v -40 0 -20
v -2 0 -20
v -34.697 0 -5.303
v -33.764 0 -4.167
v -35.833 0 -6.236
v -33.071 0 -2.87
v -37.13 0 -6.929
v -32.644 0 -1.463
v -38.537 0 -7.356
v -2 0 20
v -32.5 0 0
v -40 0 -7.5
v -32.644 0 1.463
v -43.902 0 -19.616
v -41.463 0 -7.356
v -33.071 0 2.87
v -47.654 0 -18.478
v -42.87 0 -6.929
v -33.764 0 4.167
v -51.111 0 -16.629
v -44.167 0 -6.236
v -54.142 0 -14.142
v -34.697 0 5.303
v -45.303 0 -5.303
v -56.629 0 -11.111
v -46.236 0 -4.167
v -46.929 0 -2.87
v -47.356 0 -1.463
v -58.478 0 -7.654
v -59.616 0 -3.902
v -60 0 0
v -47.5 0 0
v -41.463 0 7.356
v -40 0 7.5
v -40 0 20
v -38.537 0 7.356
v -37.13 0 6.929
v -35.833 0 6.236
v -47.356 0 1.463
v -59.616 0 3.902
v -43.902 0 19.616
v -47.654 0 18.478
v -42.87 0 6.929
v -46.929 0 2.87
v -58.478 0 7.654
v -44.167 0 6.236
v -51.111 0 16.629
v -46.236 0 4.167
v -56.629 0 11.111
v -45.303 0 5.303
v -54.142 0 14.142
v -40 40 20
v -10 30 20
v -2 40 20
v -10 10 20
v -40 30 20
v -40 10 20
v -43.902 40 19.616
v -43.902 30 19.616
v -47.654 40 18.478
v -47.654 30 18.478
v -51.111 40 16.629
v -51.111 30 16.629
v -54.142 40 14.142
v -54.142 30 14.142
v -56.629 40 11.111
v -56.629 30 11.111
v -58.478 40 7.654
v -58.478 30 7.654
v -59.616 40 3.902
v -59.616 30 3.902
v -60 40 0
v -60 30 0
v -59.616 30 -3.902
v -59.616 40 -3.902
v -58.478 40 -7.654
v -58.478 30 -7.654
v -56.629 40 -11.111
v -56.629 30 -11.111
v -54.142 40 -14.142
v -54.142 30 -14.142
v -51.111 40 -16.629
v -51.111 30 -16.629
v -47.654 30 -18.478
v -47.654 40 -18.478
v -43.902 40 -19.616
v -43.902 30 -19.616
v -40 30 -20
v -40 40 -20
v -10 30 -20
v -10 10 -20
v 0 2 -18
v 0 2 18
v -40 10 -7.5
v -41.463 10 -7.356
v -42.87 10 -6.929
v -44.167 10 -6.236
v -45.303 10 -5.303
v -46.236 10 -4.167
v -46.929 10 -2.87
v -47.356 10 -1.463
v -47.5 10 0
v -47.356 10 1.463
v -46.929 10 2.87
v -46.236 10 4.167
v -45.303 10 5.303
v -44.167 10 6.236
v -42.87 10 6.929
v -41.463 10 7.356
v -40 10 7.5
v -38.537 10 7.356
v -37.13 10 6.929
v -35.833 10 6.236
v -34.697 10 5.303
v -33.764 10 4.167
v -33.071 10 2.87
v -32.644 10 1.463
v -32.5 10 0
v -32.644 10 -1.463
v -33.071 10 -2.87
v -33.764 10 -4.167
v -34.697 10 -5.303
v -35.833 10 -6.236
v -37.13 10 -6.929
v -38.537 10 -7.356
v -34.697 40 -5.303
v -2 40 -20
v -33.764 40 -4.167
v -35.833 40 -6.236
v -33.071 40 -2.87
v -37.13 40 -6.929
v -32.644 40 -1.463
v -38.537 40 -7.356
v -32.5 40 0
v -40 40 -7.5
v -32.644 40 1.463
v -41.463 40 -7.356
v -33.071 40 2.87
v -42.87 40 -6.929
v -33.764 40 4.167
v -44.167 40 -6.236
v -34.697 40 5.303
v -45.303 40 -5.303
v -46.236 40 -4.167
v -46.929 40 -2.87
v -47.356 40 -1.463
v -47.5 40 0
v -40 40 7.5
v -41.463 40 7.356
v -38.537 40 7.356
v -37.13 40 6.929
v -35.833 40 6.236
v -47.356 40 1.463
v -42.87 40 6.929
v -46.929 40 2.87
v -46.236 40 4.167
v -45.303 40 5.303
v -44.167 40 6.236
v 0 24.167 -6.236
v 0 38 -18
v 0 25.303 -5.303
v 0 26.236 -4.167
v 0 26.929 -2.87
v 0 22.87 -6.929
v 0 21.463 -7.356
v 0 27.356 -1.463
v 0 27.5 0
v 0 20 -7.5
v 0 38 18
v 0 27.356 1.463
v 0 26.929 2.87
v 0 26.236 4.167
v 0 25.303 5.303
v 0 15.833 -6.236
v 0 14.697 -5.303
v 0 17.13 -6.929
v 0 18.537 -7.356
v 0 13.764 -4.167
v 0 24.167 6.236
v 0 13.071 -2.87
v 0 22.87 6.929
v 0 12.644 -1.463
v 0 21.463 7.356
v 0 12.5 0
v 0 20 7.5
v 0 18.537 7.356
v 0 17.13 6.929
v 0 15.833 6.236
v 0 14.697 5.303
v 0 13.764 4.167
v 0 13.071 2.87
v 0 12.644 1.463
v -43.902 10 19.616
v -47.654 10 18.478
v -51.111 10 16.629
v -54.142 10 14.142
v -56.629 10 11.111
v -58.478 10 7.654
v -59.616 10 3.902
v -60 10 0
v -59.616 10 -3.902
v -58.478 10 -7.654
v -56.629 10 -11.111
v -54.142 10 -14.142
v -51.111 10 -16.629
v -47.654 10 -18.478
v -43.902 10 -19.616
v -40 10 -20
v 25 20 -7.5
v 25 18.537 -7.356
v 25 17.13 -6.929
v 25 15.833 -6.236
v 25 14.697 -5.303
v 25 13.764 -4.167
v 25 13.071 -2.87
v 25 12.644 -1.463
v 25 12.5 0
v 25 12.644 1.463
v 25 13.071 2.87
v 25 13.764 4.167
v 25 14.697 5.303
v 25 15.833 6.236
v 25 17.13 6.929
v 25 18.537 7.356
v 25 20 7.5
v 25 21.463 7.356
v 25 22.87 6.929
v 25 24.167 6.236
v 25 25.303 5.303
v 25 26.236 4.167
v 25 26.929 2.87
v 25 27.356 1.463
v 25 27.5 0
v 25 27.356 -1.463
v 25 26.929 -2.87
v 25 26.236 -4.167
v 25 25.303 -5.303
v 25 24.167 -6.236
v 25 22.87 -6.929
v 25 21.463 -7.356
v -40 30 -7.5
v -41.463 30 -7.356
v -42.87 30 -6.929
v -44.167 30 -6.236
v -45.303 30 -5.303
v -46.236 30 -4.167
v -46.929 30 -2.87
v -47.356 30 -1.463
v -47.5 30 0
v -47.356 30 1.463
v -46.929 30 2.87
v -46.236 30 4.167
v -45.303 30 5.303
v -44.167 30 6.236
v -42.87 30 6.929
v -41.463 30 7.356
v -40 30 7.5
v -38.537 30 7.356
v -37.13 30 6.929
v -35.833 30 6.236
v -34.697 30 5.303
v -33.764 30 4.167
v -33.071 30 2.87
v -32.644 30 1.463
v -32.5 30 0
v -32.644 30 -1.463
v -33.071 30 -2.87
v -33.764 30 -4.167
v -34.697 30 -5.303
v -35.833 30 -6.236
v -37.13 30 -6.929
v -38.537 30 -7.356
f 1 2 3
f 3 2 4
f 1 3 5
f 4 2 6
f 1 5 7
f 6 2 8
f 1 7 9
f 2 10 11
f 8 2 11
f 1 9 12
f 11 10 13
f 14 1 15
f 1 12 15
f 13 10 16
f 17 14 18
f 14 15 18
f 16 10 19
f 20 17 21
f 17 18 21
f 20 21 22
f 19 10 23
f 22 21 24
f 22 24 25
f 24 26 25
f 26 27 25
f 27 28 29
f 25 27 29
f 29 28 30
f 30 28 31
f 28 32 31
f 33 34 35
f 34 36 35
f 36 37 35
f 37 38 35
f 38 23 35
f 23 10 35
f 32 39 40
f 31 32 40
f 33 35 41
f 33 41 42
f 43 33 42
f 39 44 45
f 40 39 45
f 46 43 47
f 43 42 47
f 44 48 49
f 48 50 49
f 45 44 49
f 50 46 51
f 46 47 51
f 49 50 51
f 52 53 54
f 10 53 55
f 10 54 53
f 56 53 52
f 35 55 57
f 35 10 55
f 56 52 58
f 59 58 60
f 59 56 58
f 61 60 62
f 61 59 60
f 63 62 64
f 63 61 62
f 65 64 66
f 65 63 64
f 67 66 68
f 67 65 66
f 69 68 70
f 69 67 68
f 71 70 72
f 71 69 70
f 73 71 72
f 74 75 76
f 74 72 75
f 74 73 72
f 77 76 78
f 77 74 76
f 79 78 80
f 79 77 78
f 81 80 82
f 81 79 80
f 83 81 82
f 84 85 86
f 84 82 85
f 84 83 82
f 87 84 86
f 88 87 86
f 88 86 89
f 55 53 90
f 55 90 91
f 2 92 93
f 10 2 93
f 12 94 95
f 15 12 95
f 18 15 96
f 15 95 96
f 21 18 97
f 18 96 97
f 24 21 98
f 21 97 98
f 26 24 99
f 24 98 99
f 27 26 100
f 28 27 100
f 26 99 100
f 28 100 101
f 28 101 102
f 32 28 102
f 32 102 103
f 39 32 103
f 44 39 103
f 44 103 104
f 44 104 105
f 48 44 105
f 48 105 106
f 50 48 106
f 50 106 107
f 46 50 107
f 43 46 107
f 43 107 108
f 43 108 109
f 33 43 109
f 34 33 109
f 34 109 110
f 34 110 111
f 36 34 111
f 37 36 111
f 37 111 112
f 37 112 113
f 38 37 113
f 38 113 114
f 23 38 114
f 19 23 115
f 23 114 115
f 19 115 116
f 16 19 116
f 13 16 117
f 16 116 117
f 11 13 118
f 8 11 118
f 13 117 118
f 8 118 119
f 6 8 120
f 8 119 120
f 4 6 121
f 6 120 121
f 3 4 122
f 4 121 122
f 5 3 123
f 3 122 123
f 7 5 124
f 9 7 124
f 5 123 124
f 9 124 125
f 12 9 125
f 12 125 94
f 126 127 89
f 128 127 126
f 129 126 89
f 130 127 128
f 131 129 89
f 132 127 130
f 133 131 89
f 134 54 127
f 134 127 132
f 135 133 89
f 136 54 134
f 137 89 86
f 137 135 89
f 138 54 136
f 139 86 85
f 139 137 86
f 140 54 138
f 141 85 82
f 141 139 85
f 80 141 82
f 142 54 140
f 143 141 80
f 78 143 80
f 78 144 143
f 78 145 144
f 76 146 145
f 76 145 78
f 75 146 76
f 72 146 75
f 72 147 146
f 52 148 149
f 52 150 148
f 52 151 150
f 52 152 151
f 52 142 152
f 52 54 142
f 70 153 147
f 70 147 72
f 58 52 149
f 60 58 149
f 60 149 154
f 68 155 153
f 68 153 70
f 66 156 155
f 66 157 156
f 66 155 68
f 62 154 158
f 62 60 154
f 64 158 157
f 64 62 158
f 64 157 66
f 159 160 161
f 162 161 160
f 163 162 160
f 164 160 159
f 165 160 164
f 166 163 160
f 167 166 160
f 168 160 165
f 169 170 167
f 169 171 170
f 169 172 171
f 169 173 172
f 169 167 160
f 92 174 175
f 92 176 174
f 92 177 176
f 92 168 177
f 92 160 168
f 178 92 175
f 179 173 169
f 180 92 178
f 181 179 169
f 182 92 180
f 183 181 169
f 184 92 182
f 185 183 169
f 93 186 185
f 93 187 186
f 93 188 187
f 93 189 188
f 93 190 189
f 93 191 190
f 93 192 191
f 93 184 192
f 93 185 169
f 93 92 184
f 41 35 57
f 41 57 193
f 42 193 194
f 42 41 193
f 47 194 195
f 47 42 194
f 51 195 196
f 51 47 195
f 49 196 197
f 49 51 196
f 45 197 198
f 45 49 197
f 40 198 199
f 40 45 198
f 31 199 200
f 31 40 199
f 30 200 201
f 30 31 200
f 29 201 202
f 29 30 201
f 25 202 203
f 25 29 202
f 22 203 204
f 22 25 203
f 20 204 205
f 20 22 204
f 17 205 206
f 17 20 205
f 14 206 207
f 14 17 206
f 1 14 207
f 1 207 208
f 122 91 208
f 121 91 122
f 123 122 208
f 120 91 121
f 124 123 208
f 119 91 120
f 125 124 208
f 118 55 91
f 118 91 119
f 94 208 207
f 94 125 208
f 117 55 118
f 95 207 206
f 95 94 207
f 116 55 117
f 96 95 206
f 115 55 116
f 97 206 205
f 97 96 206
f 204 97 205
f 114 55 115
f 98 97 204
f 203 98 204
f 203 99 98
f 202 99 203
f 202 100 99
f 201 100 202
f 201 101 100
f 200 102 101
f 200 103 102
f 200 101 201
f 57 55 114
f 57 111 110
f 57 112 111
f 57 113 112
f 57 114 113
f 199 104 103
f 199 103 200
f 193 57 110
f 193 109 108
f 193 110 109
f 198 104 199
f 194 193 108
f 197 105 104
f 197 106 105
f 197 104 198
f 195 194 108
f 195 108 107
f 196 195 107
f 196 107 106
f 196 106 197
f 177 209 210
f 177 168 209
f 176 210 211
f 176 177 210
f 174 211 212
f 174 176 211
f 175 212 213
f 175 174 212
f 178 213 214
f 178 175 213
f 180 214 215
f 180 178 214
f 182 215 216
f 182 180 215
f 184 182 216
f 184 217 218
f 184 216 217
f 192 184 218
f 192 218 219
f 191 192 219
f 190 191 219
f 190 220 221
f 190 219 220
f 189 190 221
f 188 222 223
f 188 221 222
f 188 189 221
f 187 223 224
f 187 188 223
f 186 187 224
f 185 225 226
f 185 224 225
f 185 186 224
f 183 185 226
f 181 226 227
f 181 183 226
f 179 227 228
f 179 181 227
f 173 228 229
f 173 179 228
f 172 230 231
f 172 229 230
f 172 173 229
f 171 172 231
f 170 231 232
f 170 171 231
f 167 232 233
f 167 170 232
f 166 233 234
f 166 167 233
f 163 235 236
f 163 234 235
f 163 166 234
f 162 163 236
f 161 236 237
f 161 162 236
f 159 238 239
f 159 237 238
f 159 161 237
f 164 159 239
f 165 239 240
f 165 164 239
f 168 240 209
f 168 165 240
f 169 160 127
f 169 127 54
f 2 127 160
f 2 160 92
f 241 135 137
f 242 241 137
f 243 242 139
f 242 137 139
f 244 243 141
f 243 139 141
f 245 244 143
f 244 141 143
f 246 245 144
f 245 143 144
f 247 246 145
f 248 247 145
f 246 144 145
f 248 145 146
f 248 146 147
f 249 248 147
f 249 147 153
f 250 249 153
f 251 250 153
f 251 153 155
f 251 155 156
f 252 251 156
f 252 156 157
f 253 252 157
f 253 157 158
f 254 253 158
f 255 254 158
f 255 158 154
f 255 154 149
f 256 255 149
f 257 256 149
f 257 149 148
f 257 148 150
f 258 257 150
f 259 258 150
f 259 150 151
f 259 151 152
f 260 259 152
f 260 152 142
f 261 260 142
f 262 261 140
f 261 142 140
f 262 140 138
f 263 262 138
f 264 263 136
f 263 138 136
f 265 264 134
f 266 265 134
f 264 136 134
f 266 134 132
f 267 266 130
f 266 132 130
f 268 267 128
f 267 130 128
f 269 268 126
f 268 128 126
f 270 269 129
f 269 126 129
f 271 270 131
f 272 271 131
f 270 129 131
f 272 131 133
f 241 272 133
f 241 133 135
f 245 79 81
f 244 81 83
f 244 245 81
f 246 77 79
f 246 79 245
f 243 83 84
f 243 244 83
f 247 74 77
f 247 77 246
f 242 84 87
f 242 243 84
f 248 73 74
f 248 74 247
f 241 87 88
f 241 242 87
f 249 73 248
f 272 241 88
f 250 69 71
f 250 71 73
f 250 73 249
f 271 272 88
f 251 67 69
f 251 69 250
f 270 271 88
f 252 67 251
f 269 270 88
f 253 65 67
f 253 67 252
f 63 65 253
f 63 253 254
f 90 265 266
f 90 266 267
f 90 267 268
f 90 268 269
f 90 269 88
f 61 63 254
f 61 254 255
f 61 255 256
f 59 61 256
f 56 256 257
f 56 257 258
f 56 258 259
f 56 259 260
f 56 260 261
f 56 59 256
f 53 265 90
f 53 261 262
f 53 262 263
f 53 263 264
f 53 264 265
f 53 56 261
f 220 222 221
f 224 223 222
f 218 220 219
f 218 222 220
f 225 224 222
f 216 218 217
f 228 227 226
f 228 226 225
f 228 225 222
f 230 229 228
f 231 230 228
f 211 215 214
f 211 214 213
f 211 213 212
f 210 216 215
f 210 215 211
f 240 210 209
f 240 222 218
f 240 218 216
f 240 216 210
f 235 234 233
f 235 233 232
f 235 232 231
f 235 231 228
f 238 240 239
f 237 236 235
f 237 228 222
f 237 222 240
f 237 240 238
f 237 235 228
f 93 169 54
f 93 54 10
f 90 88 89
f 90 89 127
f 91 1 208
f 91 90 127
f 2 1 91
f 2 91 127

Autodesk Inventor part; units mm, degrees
ref_plane "YZ Plane" through (0, 0, 0) normal (1, 0, 0) x (0, 1, 0)
ref_plane "XZ Plane" through (0, 0, 0) normal (0, 1, 0) x (-1, 0, 0)
ref_plane "XY Plane" through (0, 0, 0) normal (0, 0, 1) x (1, 0, 0)
sketch "Skizze1" plane through (0, 0, 0) normal (0, 1, 0) x (-1, 0, 0)
  line L0 (0, 20) -> (40, 20)
  line L1 (40, -20) -> (0, -20)
  line L2 (0, -20) -> (0, 20)
  arc A0 (40, -20) -> (40, 20) centre (40, 0) ccw
  line L3 (0, 0) -> (81.992, 0) construction
  point P0 (20, -20)
  dimension "d0" = 40
  dimension "d2" = 40
  dimension "d3" = 20
extrude "Extrusion1" add sketch "Skizze1" along normal blind 40
sketch "Skizze2" plane through (0, 0, 0) normal (0, -1, 0) x (1, 0, 0)
  arc A0 (-40, 20) -> (-40, -20) centre (-40, 0) ccw projected
  point P0 (0, 0)
hole "Bohrung1" at (-40, 0, 0) direction (0, 1, 0) diameter 15 depth 40
sketch "Skizze3" plane through (-40, 0, 20) normal (0, 0, 1) x (1, 0, 0)
  line L0 (30, 10) -> (-20.9704, 10)
  line L1 (-20.9704, 10) -> (-20.9704, 30)
  line L2 (-20.9704, 30) -> (30, 30)
  line L3 (30, 30) -> (30, 10)
  line L4 (40, 0) -> (40, 40) projected
  point P0 (30, 20)
  point P1 (40, 20)
  dimension "d13" = 10
  dimension "d14" = 20
extrude "Extrusion2" cut sketch "Skizze3" against normal up to surface (40 mm away)
chamfer "Fasen1" distance 2 angle 45 4 edges at (0, 20, 20) (0, 40, 0) (0, 20, -20) (0, 0, 0)
sketch "Skizze4" plane through (0, 2, -18) normal (1, 0, 0) x (0, 0, -1)
  circle A0 centre (-18, 18) radius 7.5
  line L0 (0, 36) -> (0, 0) projected
  line L1 (-38, -2) -> (2, -2) projected
  point P0 (-18, -2)
  point P1 (0, 18)
  point P2 (-18, -2)
  dimension "d20" = 15
extrude "Extrusion3" add sketch "Skizze4" along normal blind 25
properties part number "6" material "Kupfer, Legierung"
